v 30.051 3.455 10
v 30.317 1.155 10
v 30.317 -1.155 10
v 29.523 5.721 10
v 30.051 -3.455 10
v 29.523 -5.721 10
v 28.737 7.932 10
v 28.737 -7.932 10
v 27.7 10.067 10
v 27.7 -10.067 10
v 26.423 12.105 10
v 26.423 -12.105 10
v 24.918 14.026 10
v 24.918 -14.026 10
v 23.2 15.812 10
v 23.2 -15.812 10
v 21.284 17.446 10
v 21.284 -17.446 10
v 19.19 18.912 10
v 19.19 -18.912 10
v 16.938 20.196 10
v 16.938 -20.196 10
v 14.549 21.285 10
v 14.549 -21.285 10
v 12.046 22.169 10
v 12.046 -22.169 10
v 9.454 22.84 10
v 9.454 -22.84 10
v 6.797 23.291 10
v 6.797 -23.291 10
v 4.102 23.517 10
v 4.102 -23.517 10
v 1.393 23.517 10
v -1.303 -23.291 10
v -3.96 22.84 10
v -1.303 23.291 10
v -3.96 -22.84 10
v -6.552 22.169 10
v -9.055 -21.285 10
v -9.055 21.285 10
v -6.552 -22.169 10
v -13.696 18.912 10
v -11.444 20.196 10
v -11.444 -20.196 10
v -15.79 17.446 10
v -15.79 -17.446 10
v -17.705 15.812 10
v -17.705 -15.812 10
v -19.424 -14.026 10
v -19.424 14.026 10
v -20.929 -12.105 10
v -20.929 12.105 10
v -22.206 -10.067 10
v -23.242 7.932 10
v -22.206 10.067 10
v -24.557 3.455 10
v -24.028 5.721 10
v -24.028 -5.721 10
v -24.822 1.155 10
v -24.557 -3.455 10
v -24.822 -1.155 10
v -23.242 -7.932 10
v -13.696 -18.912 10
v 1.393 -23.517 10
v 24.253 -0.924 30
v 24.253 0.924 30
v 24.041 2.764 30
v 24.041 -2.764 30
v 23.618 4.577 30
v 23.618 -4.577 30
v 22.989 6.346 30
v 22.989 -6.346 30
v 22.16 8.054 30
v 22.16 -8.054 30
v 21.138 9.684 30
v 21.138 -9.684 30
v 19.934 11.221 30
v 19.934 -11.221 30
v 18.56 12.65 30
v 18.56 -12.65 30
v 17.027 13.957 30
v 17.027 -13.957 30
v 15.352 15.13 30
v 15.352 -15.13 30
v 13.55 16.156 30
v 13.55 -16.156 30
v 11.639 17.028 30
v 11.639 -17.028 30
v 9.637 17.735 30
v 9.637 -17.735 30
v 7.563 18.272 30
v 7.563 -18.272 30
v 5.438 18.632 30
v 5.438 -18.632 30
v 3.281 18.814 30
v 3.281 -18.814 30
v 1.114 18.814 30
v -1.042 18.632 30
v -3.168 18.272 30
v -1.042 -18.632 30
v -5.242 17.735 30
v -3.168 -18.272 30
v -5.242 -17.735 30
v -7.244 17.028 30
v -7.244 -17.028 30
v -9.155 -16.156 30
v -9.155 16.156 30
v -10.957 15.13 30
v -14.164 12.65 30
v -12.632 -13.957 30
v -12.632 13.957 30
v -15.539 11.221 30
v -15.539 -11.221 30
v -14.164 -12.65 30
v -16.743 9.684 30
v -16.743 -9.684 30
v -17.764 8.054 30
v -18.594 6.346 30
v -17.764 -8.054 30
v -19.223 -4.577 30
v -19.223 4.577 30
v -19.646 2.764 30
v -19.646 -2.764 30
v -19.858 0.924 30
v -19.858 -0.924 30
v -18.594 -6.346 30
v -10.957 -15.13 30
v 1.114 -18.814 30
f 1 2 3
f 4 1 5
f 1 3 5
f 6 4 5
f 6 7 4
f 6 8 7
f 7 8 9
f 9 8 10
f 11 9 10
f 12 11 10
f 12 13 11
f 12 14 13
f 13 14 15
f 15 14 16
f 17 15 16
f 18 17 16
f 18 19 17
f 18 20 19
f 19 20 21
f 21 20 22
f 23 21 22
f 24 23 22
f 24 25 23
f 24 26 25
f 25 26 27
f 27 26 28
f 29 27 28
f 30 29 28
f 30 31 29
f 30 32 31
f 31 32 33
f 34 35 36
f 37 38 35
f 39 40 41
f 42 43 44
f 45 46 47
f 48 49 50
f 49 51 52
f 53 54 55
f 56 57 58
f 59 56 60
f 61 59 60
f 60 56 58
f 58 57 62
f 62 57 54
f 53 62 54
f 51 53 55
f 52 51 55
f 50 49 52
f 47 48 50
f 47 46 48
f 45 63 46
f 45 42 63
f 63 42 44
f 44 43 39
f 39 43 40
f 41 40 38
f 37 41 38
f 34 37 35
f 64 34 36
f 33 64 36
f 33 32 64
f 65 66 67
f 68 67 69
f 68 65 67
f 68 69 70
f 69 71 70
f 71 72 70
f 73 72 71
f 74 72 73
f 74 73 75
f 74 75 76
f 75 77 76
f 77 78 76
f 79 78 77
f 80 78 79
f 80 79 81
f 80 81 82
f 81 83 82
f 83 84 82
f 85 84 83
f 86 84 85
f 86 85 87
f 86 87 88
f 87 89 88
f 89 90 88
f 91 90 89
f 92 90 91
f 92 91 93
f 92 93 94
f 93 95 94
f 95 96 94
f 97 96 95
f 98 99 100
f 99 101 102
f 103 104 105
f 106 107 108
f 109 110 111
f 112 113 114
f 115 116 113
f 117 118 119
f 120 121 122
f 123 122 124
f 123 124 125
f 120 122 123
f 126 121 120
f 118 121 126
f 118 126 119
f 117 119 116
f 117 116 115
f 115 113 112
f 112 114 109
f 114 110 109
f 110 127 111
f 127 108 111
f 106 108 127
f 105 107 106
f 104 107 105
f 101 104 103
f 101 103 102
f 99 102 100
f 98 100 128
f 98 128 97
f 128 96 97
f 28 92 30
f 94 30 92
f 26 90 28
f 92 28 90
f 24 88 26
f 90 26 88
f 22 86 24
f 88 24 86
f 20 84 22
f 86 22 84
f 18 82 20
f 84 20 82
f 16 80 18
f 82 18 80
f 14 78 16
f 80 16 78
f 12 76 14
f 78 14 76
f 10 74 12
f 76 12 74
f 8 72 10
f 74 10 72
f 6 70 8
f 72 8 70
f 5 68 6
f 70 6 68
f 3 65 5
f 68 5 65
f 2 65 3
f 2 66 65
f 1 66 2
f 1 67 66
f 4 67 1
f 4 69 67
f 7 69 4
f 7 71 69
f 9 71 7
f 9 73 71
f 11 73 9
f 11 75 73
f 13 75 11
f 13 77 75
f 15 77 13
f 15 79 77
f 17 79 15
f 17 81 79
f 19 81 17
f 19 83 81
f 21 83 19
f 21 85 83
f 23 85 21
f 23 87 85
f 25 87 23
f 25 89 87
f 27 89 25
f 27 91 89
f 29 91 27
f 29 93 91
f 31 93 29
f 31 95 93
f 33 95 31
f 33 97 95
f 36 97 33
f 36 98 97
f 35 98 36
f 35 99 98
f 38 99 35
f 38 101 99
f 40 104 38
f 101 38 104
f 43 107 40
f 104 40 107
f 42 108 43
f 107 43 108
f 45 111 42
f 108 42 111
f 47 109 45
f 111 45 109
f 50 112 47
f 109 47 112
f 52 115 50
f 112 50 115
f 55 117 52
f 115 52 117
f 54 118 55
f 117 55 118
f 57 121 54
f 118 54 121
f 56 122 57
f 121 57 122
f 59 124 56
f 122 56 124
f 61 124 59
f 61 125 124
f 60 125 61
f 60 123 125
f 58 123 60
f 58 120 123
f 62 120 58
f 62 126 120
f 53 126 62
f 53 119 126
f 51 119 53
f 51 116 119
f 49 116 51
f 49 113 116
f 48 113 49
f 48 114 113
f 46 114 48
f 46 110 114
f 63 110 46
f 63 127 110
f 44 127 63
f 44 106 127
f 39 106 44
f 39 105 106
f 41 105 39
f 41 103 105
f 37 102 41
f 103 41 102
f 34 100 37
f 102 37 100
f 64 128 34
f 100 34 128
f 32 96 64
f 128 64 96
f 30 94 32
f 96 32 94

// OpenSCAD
// Grooved handle with a top extension
// A bottom cap, grip grooves, and a matching block on the top surface.

use <../ergonomic_handle.scad>

ergonomic_handle(hand_length = 178, hand_width = 79.4, bottomcapext = 6, topext = 10, groovespc = 6);
translate([ 0, 0, 10 ]) linear_extrude(20, scale = 0.8)
    ergonomic_handle_top_ellipse(hand_length = 178, hand_width = 79.4, topext = 10);
